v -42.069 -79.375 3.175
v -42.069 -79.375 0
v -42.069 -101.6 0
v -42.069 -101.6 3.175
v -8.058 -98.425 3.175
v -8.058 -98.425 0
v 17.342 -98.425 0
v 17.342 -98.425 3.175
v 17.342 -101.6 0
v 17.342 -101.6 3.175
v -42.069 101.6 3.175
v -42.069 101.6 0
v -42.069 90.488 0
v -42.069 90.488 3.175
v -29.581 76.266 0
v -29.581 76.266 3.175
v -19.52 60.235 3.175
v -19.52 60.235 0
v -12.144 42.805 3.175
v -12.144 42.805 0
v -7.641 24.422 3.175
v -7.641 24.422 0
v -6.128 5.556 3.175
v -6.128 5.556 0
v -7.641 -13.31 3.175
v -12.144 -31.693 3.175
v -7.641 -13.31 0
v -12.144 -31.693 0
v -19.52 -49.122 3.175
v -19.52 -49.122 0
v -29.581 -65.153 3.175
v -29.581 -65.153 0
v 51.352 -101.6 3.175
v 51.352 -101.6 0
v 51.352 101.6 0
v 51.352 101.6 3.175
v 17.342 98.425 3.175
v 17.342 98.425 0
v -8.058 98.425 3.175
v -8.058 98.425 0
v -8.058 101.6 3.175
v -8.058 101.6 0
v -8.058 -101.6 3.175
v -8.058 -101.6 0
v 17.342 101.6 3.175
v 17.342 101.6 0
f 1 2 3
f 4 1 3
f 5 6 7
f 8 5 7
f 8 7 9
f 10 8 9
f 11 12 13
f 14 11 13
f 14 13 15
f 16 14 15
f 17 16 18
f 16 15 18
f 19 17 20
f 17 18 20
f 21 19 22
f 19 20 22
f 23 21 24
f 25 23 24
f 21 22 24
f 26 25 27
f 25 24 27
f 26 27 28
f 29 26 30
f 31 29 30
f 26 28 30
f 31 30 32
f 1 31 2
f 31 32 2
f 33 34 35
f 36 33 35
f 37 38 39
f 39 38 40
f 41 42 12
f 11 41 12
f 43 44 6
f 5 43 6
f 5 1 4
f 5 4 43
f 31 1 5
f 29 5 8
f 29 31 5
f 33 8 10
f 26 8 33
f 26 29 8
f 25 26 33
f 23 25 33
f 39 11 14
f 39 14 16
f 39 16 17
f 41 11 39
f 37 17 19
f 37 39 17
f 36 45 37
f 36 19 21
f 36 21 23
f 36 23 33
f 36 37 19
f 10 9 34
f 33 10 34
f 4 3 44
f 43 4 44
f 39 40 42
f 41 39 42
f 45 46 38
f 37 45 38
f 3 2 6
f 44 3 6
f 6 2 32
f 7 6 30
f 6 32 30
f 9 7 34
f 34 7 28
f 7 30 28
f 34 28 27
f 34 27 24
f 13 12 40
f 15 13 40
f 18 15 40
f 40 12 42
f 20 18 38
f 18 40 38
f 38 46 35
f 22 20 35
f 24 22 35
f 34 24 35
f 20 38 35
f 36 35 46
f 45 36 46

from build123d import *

# Parameters (mm, degrees)
F1_DEPTH = 3.175


with BuildPart() as f1:
    # F0 (on Top) → F1 (new body)
    with BuildSketch(Plane.XY):
        with BuildLine():
            Line((-42.06875, -79.375), (-42.06875, -101.6))
            Line((-42.06875, -101.6), (-14.022917, -101.6))
            Line((-14.022917, -101.6), (-13.768917, -101.6))
            Line((-13.768917, -101.6), (-8.05815, -101.6))
            Line((-8.05815, -101.6), (-8.05815, -98.425))
            Line((-8.05815, -98.425), (4.64185, -98.425))
            Line((4.64185, -98.425), (17.34185, -98.425))
            Line((17.34185, -98.425), (17.34185, -101.6))
            Line((17.34185, -101.6), (50.33645, -101.6))
            Line((50.33645, -101.6), (51.35245, -101.6))
            Line((51.35245, -101.6), (51.35245, 101.6))
            Line((51.35245, 101.6), (24.579512, 101.6))
            Line((24.579512, 101.6), (17.34185, 101.6))
            Line((17.34185, 101.6), (17.34185, 98.425))
            Line((17.34185, 98.425), (4.64185, 98.425))
            Line((4.64185, 98.425), (-8.05815, 98.425))
            Line((-8.05815, 98.425), (-8.05815, 101.6))
            Line((-8.05815, 101.6), (-13.768917, 101.6))
            Line((-13.768917, 101.6), (-14.022917, 101.6))
            Line((-14.022917, 101.6), (-42.06875, 101.6))
            Line((-42.06875, 101.6), (-42.06875, 90.4875))
            ThreePointArc((-42.06875, 90.4875), (-6.127735, 5.55625), (-42.06875, -79.375))
        make_face()
    extrude(amount=F1_DEPTH)


solid = f1.part
